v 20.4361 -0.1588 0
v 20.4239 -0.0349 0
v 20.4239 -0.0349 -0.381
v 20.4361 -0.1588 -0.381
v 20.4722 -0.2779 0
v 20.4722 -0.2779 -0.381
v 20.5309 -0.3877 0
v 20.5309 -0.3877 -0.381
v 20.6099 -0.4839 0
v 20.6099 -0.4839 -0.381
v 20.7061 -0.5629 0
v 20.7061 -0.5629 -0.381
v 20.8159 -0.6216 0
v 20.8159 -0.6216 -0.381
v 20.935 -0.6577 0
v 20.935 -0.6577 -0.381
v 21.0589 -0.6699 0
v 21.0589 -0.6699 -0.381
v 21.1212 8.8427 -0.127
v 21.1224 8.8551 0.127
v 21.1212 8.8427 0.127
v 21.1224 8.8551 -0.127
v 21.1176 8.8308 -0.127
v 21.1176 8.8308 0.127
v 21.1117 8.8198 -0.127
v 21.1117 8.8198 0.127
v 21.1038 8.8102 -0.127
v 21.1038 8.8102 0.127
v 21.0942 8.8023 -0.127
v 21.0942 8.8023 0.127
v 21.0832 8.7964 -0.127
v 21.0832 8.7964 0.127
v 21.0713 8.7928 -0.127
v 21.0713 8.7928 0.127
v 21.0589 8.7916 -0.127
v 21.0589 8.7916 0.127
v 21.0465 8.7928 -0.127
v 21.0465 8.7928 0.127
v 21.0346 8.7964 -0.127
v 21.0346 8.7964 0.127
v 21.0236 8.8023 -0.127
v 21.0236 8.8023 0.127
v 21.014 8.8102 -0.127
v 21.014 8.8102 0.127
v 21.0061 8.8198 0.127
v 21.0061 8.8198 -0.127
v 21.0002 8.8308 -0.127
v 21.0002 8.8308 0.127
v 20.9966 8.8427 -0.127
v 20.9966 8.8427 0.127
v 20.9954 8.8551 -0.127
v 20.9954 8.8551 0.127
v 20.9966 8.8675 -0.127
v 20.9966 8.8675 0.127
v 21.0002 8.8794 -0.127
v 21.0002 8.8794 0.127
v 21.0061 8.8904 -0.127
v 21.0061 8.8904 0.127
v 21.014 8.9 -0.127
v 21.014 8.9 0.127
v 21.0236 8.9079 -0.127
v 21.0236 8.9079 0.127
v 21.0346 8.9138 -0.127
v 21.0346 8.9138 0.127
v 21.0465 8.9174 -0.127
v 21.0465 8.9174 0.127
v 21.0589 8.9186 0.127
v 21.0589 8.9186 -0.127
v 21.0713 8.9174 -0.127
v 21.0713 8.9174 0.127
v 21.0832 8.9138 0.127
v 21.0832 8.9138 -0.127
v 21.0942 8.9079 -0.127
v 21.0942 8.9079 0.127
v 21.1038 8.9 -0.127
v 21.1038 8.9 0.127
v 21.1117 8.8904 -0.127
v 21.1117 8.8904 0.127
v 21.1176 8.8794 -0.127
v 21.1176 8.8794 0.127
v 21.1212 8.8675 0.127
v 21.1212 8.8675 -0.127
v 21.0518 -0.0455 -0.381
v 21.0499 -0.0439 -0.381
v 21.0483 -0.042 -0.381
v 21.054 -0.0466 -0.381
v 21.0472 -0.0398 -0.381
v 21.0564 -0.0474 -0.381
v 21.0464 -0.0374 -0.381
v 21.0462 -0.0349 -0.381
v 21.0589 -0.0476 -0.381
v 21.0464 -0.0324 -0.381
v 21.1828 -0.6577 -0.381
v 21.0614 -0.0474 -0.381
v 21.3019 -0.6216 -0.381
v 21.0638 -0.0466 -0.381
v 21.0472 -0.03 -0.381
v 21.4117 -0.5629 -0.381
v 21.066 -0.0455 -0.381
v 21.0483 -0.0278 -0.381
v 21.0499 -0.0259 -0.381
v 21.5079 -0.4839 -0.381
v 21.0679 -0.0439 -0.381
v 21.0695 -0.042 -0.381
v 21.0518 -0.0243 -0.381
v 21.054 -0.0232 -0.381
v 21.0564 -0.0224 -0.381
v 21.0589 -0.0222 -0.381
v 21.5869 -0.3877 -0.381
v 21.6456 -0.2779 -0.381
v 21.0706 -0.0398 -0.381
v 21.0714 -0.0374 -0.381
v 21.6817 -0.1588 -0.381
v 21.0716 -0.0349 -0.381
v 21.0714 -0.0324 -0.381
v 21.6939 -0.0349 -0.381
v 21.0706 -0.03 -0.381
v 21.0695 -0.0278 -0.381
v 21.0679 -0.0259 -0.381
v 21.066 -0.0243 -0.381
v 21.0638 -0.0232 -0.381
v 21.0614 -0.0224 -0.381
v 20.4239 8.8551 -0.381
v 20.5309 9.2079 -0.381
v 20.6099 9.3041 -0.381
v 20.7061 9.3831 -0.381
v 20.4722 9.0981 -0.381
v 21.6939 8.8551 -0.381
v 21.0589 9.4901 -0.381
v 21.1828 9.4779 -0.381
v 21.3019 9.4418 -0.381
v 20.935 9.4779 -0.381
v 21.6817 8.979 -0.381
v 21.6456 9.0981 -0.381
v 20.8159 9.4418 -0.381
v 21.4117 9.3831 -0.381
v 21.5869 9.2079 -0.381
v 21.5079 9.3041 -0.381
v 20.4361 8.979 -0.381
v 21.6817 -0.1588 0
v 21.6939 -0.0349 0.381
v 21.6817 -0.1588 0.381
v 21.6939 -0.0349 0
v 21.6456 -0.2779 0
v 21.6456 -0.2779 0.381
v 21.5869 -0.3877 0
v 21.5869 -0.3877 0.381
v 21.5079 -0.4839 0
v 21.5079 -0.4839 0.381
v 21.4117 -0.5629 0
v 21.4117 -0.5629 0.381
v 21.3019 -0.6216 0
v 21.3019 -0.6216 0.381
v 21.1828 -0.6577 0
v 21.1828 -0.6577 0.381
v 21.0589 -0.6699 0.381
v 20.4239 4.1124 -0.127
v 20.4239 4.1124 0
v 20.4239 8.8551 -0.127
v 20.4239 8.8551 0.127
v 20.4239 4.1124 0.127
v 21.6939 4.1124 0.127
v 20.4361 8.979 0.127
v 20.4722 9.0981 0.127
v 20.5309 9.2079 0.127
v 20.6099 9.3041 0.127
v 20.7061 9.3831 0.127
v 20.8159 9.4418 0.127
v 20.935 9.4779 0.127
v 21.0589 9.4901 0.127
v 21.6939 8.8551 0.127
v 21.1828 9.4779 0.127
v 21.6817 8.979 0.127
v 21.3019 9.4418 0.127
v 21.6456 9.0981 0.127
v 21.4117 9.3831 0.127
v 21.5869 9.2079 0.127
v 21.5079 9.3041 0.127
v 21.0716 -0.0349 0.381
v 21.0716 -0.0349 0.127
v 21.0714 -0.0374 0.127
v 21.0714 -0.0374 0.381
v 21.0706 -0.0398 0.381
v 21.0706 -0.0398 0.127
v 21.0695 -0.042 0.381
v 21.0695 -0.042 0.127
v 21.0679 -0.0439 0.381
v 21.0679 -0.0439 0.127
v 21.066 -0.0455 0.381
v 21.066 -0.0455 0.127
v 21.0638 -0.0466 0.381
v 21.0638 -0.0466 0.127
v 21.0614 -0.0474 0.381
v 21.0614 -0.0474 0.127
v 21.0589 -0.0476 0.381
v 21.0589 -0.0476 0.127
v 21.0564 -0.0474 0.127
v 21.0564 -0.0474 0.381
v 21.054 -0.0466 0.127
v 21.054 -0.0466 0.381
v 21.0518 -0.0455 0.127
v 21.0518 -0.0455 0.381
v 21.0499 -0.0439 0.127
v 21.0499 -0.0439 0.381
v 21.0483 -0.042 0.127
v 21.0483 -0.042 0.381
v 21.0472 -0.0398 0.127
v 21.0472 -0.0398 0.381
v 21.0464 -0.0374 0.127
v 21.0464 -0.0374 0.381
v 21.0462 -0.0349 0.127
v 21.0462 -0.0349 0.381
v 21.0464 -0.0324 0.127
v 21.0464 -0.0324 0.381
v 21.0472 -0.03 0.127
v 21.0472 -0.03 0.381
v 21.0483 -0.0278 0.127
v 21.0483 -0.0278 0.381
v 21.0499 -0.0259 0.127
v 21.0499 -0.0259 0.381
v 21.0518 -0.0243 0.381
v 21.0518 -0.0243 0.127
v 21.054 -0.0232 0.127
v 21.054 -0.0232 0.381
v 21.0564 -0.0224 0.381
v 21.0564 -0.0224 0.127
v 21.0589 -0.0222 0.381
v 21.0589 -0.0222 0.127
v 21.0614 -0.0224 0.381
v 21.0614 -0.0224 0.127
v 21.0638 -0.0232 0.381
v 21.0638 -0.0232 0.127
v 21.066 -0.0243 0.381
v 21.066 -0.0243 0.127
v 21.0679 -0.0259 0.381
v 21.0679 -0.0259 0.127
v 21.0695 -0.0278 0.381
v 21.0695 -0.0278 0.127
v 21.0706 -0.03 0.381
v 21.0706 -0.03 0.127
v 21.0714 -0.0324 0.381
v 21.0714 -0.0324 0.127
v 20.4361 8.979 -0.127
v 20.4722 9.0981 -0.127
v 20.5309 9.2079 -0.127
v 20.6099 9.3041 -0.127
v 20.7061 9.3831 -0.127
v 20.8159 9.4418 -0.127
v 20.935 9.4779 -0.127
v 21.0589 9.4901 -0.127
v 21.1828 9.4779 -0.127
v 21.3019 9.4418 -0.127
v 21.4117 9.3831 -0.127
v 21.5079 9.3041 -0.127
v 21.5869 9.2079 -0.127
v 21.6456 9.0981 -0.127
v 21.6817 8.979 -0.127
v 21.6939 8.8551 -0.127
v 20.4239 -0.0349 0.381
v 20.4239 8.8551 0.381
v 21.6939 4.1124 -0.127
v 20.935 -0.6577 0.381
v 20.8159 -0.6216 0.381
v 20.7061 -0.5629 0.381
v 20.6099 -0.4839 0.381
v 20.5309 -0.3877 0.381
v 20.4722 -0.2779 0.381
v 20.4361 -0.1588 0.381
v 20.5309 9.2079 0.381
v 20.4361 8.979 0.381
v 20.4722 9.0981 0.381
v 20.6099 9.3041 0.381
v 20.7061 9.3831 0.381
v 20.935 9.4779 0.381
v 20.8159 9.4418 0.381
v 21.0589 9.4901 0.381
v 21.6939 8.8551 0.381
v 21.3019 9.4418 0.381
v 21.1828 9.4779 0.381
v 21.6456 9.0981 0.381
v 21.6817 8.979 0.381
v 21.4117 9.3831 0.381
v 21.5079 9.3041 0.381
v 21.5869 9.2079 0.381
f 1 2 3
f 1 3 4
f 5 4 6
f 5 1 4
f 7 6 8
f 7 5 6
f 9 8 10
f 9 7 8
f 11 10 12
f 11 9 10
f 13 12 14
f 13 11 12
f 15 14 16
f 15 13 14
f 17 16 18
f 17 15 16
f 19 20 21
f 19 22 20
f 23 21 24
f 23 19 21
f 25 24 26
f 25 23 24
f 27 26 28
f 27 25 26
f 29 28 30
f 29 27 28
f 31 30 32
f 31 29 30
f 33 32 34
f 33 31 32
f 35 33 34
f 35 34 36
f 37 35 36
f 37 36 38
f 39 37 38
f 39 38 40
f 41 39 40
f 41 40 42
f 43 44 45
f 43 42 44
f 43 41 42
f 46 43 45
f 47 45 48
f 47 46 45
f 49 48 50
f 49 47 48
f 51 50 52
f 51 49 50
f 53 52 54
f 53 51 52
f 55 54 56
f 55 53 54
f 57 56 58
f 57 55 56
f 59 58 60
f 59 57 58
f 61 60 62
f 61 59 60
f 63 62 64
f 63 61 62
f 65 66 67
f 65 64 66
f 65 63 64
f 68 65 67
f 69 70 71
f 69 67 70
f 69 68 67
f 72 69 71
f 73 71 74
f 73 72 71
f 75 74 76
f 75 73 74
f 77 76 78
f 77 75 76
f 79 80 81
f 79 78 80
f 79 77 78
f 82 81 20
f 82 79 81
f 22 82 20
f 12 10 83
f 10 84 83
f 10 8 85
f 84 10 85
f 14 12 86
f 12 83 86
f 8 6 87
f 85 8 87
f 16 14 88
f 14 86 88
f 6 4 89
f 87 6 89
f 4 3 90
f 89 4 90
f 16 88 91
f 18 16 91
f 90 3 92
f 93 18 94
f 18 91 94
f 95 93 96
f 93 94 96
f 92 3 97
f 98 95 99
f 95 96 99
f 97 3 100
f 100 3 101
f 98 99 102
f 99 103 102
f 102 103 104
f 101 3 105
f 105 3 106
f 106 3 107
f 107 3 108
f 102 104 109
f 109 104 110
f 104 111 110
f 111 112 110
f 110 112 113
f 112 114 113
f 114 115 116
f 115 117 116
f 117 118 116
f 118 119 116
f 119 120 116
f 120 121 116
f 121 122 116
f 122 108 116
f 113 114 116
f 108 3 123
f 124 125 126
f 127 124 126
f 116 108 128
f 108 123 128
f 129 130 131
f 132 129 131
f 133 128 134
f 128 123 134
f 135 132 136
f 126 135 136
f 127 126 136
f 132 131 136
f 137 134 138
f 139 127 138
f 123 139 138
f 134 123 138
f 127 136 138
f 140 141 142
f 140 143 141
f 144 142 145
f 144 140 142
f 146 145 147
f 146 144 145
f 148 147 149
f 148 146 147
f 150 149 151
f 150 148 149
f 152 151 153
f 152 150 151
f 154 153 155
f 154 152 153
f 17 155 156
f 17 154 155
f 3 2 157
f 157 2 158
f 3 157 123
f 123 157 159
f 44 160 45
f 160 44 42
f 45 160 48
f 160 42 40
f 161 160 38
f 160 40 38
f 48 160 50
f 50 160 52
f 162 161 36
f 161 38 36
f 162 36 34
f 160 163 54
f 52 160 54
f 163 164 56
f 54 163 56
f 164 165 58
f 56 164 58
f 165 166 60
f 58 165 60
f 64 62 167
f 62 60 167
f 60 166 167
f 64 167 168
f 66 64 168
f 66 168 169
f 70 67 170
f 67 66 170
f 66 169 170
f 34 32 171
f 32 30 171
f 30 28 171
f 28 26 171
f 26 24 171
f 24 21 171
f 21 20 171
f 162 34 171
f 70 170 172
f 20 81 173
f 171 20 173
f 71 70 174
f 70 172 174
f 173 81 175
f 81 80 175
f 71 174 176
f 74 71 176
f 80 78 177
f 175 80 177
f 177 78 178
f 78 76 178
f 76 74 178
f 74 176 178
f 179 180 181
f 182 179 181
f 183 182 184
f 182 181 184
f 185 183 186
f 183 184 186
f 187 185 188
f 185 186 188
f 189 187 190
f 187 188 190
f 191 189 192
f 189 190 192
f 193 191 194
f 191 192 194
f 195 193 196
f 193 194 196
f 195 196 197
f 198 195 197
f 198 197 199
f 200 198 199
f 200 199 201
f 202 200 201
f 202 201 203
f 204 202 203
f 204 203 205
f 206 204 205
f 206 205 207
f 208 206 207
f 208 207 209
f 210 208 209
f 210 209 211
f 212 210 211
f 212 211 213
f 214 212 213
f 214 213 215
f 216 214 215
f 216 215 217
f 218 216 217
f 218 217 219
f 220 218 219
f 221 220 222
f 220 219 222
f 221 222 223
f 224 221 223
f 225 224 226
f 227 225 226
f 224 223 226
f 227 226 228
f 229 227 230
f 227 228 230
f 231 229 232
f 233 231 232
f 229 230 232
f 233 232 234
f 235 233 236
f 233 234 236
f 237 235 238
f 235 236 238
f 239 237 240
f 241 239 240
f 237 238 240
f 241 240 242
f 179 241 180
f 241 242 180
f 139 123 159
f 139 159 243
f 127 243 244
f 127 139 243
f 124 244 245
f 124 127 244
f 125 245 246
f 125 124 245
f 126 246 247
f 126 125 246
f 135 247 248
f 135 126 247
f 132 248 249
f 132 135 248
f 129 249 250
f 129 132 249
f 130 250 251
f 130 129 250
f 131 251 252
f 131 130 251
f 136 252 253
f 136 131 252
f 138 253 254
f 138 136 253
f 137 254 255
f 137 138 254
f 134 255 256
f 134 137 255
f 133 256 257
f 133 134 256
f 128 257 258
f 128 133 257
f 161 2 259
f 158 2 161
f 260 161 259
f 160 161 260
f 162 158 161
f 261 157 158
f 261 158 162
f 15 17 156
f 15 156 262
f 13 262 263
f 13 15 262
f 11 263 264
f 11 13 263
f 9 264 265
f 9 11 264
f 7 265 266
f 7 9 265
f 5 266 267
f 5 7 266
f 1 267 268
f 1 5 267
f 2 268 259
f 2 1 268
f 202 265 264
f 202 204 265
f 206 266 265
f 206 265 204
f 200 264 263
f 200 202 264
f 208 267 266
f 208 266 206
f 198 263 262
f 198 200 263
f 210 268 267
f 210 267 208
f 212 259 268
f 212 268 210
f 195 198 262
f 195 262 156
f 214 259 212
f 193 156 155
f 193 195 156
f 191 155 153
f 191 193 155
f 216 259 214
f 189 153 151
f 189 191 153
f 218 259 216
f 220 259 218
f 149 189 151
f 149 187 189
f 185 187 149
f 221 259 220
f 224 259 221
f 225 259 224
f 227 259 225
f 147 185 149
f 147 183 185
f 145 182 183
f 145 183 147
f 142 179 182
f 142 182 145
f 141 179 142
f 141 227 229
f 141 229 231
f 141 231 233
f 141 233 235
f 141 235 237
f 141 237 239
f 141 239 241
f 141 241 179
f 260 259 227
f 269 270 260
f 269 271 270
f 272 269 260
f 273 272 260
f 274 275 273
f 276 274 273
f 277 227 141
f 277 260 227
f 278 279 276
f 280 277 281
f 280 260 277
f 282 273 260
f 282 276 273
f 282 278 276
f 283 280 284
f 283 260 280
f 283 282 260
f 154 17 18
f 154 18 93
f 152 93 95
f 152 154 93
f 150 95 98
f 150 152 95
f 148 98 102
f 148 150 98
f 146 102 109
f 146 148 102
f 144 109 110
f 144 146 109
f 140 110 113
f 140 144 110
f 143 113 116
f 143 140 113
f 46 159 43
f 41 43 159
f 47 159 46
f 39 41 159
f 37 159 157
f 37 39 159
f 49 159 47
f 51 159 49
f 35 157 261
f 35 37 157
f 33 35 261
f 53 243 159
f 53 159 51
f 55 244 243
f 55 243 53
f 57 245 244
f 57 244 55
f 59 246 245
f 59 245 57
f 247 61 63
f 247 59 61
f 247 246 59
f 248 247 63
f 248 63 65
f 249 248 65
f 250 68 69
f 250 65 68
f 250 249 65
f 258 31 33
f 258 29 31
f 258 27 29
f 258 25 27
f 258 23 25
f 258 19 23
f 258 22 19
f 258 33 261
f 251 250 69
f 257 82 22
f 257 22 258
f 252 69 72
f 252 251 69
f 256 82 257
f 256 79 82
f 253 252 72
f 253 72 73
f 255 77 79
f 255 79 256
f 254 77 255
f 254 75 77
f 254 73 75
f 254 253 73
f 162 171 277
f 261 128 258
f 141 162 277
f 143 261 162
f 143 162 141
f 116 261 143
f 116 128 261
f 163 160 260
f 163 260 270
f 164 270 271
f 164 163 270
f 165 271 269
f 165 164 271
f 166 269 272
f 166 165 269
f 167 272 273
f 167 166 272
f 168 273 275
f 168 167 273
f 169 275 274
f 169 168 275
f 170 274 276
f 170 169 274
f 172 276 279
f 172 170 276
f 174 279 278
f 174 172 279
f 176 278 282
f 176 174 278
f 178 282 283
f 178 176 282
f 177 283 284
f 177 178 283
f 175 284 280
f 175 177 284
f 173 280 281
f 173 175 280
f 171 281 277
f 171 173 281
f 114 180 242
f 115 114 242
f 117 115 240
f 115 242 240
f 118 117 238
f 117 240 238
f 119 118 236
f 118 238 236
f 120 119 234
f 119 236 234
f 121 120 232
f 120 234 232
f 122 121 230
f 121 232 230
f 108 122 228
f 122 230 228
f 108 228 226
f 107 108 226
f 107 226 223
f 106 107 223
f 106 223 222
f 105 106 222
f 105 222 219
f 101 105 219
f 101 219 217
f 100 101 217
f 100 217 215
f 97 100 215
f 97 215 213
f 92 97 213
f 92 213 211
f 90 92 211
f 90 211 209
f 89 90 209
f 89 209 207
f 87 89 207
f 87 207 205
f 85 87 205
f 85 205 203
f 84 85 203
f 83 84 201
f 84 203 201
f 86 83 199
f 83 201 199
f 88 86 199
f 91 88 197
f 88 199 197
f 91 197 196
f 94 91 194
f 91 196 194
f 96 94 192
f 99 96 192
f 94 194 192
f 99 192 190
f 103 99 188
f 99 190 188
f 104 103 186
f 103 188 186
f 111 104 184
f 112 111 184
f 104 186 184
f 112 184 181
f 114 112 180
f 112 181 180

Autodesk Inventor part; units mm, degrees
ref_plane "YZ Plane" through (0, 0, 0) normal (1, 0, 0) x (0, 1, 0)
ref_plane "XZ Plane" through (0, 0, 0) normal (0, 1, 0) x (-1, 0, 0)
sketch "Sketch1" plane through (0, 0, 0) normal (0, 0, 1) x (1, 0, 0)
  line L0 (21.0589, 9.4901) -> (21.0589, 9.4901)
  line L1 (21.6939, 8.8551) -> (21.6939, -0.0349)
  line L2 (21.0589, -0.6699) -> (21.0589, -0.6699)
  line L3 (20.4239, -0.0349) -> (20.4239, 8.8551)
  arc A0 (21.0589, 9.4901) -> (20.4239, 8.8551) centre (21.0589, 8.8551) ccw
  arc A1 (21.6939, 8.8551) -> (21.0589, 9.4901) centre (21.0589, 8.8551) ccw
  arc A2 (21.0589, -0.6699) -> (21.6939, -0.0349) centre (21.0589, -0.0349) ccw
  arc A3 (20.4239, -0.0349) -> (21.0589, -0.6699) centre (21.0589, -0.0349) ccw
  point P0 (0, 0)
  point P1 (21.6939, -0.6699)
  point P2 (21.6939, 9.4901)
  point P3 (20.4239, -0.6699)
  dimension "d0" = 1.27
  dimension "d1" = 10.16
  dimension "d2" = 0.635
extrude "Extrusion1" add sketch "Sketch1" along normal mid plane 0.762
sketch "Sketch2" plane through (0, 0, 0) normal (0, 0, 1) x (1, 0, 0)
  arc A0 (21.6939, 8.8551) -> (20.4239, 8.8551) centre (21.0589, 8.8551) ccw projected
  line L0 (20.4239, 8.8551) -> (20.4239, -0.0349) projected
  line L1 (21.6939, -0.0349) -> (21.6939, 8.8551) projected
  circle A1 centre (21.0589, 8.8551) radius 0.0635
  arc A2 (21.6939, 8.8551) -> (20.4239, 8.8551) centre (21.0589, 8.8551) ccw
  line L2 (20.4239, 4.1124) -> (21.6939, 4.1124)
  line L3 (21.6939, 8.8551) -> (21.6939, -0.0349) projected
  point P0 (0, 0)
  point P1 (20.4239, 8.8551)
  dimension "d5" = 0.127
extrude "Extrusion2" cut sketch "Sketch2" along normal mid plane 0.254
ref_plane "Work Plane1" through (0, 0, 0.127) normal (0, 0, 1) x (1, 0, 0)
sketch "Sketch4" plane through (0, 0, 0.127) normal (0, 0, 1) x (1, 0, 0)
  arc A0 (20.4239, -0.0349) -> (21.6939, -0.0349) centre (21.0589, -0.0349) ccw projected
  circle A1 centre (21.0589, -0.0349) radius 0.0127
  point P0 (0, 0)
  dimension "d11" = 0.0254
extrude "Extrusion4" cut sketch "Sketch4" along normal mid plane 1.8415
properties part number "body parts" material "PVC-Piping"
